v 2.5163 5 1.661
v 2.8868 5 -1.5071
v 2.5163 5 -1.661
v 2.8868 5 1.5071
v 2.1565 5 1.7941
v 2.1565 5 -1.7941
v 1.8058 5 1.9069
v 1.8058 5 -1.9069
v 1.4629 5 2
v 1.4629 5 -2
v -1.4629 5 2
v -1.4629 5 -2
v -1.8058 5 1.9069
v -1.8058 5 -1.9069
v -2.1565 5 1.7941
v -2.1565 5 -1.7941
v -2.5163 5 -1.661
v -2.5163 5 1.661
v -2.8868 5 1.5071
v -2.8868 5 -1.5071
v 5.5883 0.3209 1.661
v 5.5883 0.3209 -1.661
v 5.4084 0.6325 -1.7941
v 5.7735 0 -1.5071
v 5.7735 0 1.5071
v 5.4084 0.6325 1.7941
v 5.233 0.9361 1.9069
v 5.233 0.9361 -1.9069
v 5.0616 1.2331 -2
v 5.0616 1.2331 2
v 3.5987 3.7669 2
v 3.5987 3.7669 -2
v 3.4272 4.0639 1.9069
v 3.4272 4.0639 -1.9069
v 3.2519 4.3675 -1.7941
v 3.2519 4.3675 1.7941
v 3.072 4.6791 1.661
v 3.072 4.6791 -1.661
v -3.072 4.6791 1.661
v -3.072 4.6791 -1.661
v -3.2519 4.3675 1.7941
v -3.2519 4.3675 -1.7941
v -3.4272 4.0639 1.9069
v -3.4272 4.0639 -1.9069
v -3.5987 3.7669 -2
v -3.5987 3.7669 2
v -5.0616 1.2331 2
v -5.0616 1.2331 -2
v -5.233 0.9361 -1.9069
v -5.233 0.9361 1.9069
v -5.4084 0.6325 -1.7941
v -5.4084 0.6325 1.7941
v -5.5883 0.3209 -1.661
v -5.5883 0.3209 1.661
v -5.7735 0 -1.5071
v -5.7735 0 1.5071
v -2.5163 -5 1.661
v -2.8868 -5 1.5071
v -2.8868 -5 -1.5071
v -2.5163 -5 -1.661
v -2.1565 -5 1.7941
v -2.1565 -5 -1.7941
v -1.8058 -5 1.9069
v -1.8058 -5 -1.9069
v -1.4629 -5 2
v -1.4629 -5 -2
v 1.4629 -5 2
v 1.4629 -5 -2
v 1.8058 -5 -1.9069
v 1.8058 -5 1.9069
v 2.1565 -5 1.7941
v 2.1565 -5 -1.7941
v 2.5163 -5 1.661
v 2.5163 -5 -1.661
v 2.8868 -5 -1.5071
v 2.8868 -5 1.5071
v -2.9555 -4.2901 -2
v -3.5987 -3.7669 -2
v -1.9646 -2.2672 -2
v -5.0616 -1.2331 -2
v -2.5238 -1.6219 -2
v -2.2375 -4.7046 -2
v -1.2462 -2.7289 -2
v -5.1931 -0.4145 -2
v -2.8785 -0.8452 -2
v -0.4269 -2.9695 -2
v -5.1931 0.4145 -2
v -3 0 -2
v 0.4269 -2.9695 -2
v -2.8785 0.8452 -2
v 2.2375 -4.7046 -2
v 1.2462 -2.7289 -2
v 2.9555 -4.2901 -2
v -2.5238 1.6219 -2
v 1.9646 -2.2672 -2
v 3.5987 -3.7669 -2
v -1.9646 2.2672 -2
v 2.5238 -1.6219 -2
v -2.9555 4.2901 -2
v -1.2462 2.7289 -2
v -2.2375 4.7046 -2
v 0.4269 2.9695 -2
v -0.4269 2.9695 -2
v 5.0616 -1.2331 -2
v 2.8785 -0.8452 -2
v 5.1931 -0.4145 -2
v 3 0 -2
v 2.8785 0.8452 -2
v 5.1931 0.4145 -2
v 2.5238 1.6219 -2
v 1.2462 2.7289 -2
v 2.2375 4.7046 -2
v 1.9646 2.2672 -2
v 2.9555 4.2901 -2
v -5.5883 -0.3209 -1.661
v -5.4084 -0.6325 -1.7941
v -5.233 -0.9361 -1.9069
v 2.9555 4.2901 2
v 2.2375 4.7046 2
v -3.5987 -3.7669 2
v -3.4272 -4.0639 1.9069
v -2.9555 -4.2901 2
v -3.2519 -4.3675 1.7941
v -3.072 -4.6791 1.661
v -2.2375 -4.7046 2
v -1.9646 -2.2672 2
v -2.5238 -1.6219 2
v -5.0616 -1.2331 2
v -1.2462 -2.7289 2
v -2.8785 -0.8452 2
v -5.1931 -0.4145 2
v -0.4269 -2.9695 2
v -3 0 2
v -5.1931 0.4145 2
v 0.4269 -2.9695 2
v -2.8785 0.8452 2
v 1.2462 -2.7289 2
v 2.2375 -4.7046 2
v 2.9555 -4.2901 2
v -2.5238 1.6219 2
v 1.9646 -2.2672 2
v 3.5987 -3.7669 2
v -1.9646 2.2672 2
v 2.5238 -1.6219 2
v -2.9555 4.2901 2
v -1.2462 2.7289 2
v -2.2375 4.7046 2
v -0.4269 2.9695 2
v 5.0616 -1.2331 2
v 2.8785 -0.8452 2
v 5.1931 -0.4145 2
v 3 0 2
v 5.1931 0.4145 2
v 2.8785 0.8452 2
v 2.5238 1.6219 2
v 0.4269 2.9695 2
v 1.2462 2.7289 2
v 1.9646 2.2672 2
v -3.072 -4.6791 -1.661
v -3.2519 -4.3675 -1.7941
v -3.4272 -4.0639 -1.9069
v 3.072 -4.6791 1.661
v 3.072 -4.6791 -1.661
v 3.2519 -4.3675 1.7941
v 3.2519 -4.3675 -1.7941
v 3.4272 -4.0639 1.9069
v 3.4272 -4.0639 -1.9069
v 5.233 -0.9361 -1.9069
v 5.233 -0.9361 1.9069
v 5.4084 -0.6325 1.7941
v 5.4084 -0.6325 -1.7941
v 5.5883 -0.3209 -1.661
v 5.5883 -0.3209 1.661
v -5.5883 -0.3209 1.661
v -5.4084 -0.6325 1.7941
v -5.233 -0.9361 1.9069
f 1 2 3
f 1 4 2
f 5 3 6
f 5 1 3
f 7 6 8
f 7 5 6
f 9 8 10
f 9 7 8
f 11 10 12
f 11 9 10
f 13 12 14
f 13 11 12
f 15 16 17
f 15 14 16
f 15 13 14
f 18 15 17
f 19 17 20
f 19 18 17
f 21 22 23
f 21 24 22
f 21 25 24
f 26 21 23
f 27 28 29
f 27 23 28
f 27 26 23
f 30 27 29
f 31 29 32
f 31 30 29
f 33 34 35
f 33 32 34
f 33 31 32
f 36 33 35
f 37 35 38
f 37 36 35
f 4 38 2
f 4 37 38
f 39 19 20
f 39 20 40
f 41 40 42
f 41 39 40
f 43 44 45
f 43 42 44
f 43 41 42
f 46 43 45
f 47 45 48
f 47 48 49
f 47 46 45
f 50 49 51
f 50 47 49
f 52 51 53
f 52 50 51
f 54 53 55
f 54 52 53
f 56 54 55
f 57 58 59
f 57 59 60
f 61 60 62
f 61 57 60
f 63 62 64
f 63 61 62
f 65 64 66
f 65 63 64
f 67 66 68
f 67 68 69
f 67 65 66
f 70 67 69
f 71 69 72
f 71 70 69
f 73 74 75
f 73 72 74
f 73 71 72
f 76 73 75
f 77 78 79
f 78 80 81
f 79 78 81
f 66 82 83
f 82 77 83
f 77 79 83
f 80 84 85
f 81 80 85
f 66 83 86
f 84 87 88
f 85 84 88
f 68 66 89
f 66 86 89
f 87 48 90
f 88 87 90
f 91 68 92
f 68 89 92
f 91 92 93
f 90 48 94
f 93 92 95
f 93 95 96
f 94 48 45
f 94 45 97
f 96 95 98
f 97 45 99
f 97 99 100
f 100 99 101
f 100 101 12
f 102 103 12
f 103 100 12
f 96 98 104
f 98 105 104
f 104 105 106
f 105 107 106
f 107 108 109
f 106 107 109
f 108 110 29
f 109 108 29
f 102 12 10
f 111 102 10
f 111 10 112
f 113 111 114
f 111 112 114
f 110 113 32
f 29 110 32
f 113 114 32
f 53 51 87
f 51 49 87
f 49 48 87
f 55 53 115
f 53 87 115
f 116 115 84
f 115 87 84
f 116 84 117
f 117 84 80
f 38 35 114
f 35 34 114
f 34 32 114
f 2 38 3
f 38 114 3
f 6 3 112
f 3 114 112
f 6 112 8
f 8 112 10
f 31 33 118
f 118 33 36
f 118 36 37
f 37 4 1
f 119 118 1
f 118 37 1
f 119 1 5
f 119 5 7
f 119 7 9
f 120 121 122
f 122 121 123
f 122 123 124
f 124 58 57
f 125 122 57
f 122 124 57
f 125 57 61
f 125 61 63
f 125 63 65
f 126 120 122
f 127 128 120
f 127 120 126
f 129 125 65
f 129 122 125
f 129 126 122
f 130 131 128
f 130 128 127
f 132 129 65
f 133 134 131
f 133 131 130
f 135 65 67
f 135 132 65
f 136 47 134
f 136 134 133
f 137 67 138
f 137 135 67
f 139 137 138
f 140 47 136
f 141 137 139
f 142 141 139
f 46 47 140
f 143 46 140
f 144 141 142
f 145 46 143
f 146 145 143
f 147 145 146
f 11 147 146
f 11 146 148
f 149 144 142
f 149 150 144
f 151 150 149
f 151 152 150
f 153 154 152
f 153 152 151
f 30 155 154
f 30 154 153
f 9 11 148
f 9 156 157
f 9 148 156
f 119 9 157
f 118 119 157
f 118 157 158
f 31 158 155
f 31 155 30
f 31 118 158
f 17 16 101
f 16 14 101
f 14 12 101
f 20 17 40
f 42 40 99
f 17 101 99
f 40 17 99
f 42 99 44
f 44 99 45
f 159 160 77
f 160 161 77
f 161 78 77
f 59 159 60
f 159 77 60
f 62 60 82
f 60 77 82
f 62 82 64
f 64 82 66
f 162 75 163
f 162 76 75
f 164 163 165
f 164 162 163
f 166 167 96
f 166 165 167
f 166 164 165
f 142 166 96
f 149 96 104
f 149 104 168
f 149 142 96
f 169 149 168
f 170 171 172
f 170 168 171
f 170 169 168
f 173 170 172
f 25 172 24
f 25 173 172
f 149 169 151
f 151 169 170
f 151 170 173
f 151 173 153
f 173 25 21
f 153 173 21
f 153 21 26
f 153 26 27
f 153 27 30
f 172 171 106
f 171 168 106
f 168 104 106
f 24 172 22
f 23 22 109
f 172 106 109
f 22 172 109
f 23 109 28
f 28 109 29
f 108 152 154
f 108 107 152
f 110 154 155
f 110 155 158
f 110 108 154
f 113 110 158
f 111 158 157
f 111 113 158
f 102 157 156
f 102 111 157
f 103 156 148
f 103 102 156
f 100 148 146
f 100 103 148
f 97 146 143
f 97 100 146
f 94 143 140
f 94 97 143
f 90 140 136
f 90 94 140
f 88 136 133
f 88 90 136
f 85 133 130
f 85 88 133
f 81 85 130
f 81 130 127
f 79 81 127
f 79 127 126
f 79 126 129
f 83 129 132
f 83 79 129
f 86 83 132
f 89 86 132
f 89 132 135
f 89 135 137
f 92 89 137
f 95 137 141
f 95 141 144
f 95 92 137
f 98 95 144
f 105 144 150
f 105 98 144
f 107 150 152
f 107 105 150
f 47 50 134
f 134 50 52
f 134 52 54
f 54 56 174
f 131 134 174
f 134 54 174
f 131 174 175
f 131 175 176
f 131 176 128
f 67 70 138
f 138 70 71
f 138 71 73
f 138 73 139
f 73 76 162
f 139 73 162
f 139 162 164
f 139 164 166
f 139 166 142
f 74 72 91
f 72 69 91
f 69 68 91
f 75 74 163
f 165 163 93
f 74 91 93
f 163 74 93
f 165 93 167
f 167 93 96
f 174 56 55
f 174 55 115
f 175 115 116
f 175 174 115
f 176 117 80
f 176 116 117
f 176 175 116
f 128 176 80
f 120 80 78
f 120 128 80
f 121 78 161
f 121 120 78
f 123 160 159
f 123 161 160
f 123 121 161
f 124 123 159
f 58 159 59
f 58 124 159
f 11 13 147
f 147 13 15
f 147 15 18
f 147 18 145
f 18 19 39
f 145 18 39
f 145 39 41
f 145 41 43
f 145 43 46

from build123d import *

# Parameters (mm, degrees)
SKETCH_R  = 3
PAD_DEPTH = 2


with BuildPart() as part:
    # Sketch → Pad (new body, symmetric)
    with BuildSketch(Plane.XY):
        Polygon((2.886751, 5), (-2.886751, 5), (-5.773503, 0), (-2.886751, -5), (2.886751, -5), (5.773503, 0), align=None)
        Circle(SKETCH_R, mode=Mode.SUBTRACT)
    extrude(amount=PAD_DEPTH, both=True)

    # Sketch001 → Groove (revolve, cut)
    with BuildSketch(Plane.XZ):
        Polygon((4.606088, 2.527526), (6.100964, 1.220869), (6.100964, -1.220869), (4.606088, -2.527526), (7.425626, -2.527526), (7.425626, 2.527526), align=None)
    revolve(axis=Axis((0, 0, 0), (0, 0, 1)), mode=Mode.SUBTRACT)


solid = part.part
